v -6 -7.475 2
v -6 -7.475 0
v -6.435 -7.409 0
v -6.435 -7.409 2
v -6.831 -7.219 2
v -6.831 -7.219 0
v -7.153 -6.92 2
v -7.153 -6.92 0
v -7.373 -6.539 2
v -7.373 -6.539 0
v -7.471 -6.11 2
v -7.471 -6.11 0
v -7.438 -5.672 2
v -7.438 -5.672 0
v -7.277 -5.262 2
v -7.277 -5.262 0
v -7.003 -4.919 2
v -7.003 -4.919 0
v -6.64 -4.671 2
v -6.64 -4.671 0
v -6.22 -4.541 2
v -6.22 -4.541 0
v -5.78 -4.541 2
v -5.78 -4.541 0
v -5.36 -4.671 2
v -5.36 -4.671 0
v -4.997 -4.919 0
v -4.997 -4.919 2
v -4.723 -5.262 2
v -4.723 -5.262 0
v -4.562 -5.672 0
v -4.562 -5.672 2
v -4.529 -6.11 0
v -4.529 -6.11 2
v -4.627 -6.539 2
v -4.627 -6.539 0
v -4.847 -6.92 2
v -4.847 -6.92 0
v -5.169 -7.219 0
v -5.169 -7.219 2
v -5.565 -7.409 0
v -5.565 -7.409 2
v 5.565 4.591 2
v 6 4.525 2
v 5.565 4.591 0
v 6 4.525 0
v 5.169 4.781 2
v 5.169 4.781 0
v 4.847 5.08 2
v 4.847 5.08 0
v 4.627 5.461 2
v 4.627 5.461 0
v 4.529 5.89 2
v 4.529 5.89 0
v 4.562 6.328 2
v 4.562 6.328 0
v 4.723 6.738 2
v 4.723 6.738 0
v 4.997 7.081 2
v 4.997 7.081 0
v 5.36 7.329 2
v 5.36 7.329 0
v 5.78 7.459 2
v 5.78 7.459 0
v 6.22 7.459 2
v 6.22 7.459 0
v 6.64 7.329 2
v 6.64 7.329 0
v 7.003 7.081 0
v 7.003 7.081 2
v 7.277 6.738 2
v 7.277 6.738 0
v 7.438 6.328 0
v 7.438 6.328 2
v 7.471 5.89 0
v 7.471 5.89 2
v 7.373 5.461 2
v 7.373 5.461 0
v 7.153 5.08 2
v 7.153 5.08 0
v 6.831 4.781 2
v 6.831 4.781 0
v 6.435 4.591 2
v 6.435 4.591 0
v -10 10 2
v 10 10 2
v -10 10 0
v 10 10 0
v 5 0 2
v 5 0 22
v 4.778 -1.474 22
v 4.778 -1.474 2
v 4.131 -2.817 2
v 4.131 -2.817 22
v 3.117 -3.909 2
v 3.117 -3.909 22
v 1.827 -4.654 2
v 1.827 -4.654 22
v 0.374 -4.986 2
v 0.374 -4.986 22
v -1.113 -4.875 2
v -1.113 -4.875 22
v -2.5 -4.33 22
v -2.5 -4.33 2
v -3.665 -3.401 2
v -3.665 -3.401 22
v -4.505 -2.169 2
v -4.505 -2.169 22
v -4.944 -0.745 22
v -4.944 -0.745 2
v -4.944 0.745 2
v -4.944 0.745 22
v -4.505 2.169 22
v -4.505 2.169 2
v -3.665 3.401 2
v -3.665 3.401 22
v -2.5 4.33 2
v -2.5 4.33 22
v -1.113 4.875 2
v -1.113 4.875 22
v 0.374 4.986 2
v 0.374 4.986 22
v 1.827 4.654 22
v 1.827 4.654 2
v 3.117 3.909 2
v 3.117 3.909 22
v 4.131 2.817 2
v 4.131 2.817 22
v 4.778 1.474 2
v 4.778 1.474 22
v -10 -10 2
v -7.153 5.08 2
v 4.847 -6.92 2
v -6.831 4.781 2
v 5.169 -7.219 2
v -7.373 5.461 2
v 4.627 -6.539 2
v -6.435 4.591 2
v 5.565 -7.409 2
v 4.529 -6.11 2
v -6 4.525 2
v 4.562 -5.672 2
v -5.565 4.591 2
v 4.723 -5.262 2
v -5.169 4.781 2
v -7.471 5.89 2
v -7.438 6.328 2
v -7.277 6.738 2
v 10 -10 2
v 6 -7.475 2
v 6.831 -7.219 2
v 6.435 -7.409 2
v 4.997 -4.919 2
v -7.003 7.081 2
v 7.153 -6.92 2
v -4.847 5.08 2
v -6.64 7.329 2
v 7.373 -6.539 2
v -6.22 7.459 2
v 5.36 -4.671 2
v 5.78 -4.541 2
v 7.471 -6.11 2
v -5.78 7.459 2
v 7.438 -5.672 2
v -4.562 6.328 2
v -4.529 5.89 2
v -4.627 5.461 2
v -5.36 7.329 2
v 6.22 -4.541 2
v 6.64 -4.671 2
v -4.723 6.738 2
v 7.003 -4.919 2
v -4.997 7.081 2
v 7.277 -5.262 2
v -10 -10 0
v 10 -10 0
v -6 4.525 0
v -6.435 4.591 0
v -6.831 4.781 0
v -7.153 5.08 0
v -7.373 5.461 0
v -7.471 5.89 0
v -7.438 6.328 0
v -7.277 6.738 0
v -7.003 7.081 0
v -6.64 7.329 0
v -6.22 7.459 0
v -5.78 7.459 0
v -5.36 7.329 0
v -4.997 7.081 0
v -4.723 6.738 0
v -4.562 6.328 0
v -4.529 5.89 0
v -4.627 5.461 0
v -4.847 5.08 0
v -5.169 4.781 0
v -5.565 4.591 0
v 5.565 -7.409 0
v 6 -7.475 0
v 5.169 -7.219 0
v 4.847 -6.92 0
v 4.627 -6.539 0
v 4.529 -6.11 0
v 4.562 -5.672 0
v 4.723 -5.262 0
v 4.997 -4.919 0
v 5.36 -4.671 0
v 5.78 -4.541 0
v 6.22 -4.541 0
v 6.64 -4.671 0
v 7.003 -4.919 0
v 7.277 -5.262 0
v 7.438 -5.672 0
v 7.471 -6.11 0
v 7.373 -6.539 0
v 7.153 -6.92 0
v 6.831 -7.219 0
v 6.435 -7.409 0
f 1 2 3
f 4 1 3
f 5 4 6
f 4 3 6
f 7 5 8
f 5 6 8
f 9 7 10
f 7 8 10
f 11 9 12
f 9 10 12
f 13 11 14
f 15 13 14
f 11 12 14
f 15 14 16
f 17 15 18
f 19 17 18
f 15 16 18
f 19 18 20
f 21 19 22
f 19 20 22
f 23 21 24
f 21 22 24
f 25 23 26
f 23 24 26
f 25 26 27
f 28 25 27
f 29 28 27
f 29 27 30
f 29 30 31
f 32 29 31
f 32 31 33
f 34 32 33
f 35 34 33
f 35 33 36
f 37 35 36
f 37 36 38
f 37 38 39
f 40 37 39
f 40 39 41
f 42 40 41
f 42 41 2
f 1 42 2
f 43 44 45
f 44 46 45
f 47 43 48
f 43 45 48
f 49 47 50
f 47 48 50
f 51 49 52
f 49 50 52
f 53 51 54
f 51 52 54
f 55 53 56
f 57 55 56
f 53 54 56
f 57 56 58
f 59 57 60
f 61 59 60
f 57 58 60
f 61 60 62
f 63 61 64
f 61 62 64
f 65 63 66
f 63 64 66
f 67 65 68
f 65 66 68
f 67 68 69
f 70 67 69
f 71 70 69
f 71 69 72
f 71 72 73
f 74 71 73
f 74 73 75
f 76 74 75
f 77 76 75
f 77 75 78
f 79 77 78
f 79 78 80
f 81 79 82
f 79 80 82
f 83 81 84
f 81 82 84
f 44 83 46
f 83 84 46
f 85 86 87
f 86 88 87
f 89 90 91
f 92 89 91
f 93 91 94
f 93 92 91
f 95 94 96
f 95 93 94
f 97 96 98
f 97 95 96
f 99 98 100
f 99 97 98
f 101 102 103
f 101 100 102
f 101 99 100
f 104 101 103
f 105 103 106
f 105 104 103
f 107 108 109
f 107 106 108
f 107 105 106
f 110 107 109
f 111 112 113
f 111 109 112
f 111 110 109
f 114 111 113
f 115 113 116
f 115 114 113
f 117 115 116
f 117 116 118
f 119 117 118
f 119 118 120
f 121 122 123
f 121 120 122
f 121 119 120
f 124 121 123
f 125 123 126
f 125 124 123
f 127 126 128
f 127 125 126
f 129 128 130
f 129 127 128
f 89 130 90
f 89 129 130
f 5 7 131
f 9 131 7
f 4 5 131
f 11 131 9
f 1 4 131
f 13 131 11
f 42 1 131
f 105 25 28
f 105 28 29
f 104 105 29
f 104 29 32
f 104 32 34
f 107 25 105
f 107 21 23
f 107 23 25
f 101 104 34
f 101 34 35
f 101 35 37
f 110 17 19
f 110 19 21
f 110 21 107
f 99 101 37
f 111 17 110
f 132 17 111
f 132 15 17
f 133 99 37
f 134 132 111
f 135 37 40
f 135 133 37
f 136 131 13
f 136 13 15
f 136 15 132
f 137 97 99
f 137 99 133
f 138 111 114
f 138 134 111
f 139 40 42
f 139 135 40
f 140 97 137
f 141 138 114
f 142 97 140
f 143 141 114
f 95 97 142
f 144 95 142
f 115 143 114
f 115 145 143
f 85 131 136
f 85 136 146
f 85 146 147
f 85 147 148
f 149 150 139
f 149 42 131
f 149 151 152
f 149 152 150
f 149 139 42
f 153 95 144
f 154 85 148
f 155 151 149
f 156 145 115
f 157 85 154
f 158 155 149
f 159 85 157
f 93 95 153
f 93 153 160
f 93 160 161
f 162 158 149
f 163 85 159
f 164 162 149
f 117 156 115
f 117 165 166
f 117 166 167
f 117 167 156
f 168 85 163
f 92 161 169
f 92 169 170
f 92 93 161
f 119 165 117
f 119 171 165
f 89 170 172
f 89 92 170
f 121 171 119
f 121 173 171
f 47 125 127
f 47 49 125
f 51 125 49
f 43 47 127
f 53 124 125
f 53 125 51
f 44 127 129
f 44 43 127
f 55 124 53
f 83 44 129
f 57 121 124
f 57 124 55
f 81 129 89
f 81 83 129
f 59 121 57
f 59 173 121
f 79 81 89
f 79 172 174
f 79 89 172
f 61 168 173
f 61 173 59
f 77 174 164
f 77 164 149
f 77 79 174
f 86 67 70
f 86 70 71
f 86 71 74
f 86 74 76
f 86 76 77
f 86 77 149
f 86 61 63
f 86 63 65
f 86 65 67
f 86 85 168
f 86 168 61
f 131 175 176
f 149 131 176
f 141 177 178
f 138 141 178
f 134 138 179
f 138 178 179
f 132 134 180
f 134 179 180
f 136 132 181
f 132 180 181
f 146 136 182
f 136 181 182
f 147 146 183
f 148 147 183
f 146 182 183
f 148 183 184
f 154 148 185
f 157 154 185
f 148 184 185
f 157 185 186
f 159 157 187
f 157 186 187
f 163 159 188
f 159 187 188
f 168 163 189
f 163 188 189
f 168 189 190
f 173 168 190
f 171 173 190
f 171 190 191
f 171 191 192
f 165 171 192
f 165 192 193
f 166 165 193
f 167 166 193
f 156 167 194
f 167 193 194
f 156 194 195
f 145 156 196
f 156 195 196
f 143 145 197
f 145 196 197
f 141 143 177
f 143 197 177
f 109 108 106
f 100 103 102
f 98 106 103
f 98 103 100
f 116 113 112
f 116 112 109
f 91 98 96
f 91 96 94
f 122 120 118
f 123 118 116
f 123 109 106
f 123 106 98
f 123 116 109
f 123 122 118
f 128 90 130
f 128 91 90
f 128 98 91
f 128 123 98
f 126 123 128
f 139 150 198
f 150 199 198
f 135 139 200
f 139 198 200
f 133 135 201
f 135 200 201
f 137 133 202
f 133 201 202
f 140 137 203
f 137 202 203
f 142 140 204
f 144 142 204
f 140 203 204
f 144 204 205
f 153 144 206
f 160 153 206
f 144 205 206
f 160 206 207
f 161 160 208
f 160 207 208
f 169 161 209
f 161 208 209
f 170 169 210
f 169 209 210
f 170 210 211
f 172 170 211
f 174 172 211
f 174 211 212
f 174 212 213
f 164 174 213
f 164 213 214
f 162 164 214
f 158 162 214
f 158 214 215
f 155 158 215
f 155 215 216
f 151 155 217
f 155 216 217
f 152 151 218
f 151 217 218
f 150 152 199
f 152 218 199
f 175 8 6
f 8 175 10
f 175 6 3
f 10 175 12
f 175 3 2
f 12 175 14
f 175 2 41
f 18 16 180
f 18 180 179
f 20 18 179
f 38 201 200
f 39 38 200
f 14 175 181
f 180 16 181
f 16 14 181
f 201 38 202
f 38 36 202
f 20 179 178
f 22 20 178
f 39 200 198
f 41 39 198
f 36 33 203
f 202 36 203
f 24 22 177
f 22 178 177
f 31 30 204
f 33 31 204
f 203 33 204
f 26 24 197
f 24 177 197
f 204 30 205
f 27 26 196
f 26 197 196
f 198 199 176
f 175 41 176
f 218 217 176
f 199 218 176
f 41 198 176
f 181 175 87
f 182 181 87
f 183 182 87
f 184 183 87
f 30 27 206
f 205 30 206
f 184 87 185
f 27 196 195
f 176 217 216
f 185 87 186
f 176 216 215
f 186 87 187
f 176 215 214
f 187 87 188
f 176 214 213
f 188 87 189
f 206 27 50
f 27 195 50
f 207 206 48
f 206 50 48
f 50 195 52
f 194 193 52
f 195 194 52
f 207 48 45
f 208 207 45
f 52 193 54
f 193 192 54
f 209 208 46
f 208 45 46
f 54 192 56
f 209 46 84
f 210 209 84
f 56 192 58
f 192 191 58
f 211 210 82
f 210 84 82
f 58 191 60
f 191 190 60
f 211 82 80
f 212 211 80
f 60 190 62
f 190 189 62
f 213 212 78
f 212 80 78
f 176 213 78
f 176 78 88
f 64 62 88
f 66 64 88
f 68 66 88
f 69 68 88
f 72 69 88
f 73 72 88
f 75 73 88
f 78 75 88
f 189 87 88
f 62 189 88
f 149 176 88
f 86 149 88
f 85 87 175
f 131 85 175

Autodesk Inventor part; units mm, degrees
ref_plane "YZ Plane" through (0, 0, 0) normal (1, 0, 0) x (0, 1, 0)
ref_plane "XZ Plane" through (0, 0, 0) normal (0, 1, 0) x (-1, 0, 0)
ref_plane "XY Plane" through (0, 0, 0) normal (0, 0, 1) x (1, 0, 0)
sketch "Skizze1" plane through (0, 0, 0) normal (0, 0, 1) x (1, 0, 0)
  line L0 (-10, -10) -> (10, -10)
  line L1 (10, -10) -> (10, 10)
  line L2 (10, 10) -> (-10, 10)
  line L3 (-10, 10) -> (-10, -10)
  line L4 (-10, -10) -> (10, 10) construction
  line L5 (10, -10) -> (-10, 10) construction
  point P0 (0, 0)
  dimension "d0" = 20
  dimension "d1" = 20
extrude "Extrusion1" add sketch "Skizze1" along normal blind 2
sketch "Skizze2" plane through (0, 0, 2) normal (0, 0, 1) x (1, 0, 0)
  circle A0 centre (0, 0) radius 5
  dimension "d4" = 10
extrude "Extrusion2" add sketch "Skizze2" along normal blind 20
sketch "Skizze3" plane through (0, 0, 2) normal (0, 0, 1) x (1, 0, 0)
  line L0 (10, 10) -> (-10, 10) projected
  line L1 (-10, 10) -> (-10, -10) projected
  line L2 (10, -10) -> (10, 10) projected
  line L3 (-10, -10) -> (10, -10) projected
  point P0 (0, 0)
  point P1 (-6, 6)
  point P2 (6, 6)
  point P3 (6, -6)
  point P4 (-6, -6)
  dimension "d7" = 4
  dimension "d8" = 4
  dimension "d9" = 4
  dimension "d10" = 4
  dimension "d11" = 4
  dimension "d12" = 4
  dimension "d13" = 4
  dimension "d14" = 4
hole "Bohrung1" at (-6, 6, 2) at (6, 6, 2) at (6, -6, 2) at (-6, -6, 2) direction (0, 0, -1) diameter 2.95 end through all
properties part number "Laserhalter Mittelteil 29112018"
